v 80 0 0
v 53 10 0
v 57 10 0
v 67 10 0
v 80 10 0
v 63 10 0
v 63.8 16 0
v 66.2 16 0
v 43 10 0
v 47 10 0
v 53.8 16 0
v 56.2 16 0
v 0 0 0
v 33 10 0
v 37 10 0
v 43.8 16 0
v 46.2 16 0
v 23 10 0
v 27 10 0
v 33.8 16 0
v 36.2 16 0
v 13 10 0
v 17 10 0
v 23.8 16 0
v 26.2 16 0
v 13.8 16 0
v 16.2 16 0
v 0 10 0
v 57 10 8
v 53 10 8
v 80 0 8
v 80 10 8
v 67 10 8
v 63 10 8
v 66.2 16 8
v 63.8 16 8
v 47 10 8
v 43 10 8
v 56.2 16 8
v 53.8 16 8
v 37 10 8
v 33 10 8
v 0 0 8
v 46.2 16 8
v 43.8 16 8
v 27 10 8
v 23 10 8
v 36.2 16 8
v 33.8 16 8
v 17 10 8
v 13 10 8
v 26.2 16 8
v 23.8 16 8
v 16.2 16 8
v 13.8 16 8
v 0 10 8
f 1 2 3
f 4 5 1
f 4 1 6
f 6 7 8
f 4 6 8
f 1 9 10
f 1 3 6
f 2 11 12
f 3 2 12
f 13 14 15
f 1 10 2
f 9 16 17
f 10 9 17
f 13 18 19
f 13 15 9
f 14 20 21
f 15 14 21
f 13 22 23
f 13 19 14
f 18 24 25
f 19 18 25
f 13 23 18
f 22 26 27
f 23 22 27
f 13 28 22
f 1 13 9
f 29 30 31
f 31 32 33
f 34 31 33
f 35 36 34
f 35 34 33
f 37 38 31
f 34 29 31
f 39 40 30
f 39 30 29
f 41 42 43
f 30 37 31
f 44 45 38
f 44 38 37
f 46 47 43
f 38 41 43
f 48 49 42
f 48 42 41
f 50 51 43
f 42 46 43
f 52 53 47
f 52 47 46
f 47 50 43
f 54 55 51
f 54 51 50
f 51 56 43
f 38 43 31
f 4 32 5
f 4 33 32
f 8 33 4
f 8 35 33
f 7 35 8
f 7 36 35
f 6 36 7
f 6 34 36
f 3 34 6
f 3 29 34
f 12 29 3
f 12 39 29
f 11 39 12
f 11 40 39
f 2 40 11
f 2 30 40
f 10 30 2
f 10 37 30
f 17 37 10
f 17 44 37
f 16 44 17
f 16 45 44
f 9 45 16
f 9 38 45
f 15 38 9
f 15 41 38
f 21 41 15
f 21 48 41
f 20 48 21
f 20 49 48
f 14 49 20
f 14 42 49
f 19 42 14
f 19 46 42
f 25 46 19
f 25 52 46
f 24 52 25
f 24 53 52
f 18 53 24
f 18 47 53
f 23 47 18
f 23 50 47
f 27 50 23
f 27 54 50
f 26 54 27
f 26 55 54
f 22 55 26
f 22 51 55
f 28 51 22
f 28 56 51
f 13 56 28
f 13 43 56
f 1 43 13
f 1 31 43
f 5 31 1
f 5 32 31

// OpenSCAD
$fn = 32;

// ----------------------------------------------------------------------
// Gear rack: 6 teeth on a 80 mm bar, pitch 10 mm
// ----------------------------------------------------------------------

// --- parameters (mm) ---
profile_height = 8;       // extrusion height
profile_points = 28;      // points of the closed outline

profile = [[0, 0], [80, 0], [80, 10], [67, 10], [66.2, 16], [63.8, 16], [63, 10], [57, 10], [56.2, 16], [53.8, 16], [53, 10], [47, 10], [46.2, 16], [43.8, 16], [43, 10], [37, 10], [36.2, 16], [33.8, 16], [33, 10], [27, 10], [26.2, 16], [23.8, 16], [23, 10], [17, 10], [16.2, 16], [13.8, 16], [13, 10], [0, 10]];  // single closed polygon, 28 points, counter clockwise

// --- the one profile operation ---
linear_extrude(height = profile_height) polygon(points = profile);
